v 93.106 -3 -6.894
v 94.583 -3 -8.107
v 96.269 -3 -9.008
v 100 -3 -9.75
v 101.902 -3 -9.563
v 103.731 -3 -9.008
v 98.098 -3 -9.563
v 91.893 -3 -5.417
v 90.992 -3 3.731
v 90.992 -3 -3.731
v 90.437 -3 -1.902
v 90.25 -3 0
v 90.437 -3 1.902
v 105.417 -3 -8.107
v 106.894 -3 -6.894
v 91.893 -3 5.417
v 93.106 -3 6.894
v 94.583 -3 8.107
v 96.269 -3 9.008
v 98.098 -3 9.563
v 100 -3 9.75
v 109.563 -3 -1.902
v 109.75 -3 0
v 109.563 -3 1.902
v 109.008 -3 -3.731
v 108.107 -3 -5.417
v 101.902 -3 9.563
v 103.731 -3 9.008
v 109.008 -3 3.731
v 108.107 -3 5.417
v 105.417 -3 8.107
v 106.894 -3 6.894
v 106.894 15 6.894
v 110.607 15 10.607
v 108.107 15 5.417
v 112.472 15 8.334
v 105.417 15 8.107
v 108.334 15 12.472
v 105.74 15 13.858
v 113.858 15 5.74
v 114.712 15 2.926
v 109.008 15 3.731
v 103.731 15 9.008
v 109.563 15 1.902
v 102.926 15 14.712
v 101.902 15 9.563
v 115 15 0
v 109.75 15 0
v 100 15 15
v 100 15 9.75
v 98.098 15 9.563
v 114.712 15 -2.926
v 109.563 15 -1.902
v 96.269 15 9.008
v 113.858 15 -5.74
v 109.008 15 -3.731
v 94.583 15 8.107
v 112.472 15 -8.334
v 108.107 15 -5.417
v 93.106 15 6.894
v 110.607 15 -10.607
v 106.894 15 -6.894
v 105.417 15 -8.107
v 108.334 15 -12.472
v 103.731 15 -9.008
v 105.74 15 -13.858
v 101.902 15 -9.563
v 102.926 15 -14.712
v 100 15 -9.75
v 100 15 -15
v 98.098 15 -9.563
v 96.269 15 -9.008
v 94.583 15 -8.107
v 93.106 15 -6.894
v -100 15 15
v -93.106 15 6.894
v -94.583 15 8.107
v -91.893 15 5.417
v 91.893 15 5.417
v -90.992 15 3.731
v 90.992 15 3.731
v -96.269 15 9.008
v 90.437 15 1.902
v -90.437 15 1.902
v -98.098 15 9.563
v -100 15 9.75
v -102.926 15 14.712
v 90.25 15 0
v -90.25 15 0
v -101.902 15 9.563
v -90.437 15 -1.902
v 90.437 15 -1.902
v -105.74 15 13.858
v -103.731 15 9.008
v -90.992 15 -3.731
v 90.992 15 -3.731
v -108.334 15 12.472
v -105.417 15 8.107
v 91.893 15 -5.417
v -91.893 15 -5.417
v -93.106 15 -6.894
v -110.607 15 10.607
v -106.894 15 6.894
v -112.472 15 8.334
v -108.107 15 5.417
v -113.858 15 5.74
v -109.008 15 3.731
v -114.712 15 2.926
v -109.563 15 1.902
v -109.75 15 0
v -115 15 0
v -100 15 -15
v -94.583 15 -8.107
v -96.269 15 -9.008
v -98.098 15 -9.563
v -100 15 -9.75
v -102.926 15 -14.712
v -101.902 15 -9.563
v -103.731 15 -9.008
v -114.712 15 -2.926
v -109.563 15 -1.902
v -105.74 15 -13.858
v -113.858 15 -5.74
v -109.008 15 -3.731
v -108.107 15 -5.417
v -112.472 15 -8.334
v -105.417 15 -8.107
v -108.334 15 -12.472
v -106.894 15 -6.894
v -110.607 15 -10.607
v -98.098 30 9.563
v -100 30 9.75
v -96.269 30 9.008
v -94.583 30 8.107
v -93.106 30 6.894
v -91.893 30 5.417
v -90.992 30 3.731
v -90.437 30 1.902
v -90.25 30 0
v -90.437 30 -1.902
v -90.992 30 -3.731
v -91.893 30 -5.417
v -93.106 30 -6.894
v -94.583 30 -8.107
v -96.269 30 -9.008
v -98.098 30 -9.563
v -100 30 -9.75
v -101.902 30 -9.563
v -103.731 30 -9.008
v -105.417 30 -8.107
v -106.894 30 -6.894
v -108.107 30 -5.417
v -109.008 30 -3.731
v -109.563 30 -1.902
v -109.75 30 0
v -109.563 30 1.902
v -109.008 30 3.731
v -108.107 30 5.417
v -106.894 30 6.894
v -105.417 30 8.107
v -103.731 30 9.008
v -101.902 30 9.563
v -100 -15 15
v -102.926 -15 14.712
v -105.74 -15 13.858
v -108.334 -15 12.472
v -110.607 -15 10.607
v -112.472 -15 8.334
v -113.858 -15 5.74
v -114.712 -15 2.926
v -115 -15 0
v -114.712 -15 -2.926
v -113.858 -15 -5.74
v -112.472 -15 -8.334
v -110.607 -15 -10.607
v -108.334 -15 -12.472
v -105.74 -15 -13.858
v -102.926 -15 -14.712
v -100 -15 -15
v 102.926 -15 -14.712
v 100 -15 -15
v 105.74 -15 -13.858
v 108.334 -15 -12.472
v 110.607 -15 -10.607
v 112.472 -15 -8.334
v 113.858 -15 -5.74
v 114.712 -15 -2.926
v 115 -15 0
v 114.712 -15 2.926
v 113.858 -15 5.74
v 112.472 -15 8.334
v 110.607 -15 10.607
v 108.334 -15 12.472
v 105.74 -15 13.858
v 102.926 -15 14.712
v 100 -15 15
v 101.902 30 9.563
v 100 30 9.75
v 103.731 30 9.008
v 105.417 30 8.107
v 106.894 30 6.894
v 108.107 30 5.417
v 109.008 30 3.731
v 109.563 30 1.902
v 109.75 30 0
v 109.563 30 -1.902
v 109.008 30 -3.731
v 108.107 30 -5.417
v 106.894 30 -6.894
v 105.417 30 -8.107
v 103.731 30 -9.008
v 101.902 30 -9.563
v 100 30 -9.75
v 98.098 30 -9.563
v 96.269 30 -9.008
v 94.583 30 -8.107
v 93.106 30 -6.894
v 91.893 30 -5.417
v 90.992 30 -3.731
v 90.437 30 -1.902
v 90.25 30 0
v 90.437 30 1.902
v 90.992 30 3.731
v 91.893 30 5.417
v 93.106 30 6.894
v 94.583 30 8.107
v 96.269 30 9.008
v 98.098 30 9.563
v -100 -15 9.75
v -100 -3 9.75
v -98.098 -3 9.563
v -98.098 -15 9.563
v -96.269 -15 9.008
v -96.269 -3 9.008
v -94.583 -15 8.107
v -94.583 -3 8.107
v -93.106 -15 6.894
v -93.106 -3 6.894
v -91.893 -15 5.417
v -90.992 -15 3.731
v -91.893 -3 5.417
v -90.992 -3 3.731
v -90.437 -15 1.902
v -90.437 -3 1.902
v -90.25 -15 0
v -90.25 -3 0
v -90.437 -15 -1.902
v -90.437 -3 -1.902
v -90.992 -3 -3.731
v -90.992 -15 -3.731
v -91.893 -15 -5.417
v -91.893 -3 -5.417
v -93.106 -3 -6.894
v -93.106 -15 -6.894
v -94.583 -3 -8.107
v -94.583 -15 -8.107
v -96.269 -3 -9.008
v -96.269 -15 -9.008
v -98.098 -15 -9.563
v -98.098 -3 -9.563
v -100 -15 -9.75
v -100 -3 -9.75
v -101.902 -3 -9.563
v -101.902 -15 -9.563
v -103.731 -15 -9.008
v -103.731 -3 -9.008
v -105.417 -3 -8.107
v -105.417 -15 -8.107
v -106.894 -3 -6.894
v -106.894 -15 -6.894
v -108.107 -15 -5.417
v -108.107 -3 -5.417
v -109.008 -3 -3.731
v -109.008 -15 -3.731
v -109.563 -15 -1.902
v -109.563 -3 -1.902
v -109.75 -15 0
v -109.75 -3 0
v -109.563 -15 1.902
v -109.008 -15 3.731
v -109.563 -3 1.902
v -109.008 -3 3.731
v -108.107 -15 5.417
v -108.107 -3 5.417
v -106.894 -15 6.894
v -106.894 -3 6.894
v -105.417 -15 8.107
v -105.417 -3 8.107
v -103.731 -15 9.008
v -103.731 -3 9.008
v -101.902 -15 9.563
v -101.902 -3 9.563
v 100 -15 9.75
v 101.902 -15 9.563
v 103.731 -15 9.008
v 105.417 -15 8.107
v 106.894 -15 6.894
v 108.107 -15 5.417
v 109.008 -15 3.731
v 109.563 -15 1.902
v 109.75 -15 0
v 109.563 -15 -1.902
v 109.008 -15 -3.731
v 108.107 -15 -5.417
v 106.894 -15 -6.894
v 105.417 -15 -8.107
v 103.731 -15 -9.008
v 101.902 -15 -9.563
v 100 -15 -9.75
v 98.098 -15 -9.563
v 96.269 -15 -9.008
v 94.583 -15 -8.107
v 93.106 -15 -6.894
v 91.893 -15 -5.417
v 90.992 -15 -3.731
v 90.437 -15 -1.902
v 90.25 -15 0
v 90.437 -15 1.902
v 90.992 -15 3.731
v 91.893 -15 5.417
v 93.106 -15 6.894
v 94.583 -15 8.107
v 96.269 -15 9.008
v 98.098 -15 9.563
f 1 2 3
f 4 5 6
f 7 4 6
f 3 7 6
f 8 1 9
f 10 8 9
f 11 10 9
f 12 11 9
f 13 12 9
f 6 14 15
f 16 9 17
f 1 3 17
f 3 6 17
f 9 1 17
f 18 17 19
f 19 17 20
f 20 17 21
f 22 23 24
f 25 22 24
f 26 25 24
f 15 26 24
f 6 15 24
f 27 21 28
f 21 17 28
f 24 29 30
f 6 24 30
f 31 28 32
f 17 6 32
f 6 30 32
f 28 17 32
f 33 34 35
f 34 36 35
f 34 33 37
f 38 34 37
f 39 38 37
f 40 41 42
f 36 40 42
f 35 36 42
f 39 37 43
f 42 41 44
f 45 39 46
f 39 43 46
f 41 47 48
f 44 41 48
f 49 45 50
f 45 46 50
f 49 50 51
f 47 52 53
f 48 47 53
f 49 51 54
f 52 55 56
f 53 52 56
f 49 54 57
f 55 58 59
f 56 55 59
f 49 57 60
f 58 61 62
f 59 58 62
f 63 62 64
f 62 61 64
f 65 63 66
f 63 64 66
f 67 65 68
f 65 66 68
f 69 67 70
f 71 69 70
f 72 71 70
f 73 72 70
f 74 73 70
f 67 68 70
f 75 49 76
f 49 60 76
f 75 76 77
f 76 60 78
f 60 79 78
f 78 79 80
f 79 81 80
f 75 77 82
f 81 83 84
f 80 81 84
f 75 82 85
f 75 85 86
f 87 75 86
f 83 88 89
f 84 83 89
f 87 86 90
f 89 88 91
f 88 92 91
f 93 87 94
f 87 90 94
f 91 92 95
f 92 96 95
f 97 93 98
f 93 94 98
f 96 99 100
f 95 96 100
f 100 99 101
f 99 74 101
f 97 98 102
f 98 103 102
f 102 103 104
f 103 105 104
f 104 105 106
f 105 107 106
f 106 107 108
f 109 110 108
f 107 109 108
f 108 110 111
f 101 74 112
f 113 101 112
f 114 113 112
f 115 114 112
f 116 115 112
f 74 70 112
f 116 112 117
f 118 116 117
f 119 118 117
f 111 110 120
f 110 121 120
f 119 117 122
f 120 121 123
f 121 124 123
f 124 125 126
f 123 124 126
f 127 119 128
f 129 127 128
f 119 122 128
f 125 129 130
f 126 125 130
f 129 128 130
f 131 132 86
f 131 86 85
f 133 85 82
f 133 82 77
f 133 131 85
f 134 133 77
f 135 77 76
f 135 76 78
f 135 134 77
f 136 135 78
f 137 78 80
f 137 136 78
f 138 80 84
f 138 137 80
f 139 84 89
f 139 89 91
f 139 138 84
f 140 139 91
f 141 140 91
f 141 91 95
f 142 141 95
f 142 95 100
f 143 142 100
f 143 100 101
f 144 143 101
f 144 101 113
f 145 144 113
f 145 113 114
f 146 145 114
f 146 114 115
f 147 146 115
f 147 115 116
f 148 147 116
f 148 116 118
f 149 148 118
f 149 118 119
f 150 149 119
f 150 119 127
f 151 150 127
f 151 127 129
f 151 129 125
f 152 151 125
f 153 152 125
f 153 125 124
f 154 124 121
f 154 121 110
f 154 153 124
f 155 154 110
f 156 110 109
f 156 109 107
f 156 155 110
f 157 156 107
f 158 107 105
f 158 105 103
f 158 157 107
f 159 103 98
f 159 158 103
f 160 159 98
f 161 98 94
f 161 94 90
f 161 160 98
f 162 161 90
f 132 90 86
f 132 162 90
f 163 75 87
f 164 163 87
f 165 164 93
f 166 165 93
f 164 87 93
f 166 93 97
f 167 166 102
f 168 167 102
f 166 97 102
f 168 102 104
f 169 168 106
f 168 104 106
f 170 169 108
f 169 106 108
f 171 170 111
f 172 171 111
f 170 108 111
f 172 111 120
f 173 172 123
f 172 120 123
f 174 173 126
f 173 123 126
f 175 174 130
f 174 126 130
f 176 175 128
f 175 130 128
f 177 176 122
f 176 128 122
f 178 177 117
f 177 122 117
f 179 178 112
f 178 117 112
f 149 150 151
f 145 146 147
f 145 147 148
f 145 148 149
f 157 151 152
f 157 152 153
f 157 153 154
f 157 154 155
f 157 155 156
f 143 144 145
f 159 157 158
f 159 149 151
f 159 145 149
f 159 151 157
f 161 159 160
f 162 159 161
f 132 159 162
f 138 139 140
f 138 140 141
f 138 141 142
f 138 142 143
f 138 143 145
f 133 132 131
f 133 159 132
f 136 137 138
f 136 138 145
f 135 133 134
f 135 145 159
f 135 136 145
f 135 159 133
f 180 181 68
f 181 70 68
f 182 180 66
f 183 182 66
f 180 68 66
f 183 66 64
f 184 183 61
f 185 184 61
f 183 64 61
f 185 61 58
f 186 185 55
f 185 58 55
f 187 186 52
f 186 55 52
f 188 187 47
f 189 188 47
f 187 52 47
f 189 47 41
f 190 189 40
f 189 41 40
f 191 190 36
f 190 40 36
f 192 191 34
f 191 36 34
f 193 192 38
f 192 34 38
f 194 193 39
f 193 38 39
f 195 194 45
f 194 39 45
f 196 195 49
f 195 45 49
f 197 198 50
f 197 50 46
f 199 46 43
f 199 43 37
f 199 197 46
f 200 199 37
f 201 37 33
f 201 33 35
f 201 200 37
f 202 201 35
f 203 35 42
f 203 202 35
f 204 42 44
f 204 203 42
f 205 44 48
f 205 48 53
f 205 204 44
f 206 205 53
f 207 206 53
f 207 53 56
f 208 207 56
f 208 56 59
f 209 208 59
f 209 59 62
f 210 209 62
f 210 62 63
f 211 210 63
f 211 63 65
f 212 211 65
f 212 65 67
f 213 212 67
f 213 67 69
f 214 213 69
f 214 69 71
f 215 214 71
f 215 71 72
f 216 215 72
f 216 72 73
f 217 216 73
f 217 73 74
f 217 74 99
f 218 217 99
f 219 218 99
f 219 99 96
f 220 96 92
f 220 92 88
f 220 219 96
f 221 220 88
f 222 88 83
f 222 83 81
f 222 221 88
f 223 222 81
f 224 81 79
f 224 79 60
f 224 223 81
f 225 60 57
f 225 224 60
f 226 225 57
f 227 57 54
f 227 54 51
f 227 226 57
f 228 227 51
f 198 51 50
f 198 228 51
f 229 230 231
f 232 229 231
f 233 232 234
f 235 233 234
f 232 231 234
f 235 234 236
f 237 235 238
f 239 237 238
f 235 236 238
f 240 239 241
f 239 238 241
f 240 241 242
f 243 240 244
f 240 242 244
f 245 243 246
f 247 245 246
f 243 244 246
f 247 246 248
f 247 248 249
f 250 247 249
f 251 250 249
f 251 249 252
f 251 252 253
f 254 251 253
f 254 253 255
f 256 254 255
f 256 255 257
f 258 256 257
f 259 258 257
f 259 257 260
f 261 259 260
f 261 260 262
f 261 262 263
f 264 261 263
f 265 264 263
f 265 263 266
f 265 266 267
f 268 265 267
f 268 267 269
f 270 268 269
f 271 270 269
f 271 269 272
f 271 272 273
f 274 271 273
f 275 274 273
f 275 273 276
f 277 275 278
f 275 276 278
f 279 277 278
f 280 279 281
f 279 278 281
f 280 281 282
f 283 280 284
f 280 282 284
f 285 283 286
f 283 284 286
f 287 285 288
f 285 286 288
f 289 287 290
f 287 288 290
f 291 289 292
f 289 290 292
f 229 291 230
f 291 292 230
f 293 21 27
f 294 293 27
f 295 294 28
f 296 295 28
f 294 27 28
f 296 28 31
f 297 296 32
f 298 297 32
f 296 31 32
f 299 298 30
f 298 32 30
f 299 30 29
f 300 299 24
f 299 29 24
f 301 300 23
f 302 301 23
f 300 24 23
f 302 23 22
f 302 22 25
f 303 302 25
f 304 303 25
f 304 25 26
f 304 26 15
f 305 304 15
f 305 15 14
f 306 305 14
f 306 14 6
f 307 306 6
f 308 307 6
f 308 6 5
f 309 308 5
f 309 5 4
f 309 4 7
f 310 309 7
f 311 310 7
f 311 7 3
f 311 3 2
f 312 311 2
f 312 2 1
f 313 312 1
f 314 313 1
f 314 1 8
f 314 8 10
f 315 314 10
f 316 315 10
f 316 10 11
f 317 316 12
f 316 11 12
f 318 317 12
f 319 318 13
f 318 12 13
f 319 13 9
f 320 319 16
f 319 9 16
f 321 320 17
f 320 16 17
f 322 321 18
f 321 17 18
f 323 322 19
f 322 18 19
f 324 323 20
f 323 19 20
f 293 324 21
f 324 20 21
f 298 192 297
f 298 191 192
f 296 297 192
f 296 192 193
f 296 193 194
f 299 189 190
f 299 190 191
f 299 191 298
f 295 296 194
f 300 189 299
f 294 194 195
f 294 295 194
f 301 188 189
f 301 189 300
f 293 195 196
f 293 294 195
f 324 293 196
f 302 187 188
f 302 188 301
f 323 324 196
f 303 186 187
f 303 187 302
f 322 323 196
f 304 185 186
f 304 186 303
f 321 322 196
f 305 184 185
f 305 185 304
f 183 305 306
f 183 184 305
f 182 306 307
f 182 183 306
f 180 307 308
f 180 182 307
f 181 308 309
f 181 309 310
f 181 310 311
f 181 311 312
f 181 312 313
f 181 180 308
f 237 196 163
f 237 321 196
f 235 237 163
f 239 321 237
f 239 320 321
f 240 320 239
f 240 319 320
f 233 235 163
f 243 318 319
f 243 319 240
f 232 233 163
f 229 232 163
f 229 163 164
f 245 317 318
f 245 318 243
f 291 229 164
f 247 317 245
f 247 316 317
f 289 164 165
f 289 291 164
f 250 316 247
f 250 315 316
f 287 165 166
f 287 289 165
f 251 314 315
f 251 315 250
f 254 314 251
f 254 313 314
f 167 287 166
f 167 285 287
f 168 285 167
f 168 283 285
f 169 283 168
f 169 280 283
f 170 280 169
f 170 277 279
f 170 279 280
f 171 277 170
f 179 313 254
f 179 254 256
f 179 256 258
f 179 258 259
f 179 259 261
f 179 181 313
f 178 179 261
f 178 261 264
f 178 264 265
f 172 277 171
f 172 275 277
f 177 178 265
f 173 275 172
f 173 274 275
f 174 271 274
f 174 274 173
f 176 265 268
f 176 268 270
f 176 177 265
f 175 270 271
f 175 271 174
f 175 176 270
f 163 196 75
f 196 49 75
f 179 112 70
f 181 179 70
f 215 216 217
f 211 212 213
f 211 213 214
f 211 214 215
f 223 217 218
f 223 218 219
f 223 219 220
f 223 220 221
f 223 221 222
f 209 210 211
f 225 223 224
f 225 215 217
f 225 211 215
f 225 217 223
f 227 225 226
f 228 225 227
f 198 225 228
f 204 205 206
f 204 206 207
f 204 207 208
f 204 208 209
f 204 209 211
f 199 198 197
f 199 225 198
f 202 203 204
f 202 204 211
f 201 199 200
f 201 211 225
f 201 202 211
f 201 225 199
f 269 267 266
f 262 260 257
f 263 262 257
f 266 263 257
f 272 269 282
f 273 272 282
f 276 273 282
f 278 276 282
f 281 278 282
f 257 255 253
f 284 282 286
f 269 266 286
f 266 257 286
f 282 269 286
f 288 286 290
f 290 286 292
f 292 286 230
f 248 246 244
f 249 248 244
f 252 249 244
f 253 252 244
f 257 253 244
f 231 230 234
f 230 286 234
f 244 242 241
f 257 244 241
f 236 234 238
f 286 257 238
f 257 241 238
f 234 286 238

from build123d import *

# Parameters (mm, degrees)
BOSS_EXTRUDE1_DEPTH = 15
SKETCH2_R           = 9.75
CUT_EXTRUDE1_DEPTH  = 117.940155635
BOSS_EXTRUDE2_START = 30
SKETCH2_2_R         = 9.75
BOSS_EXTRUDE2_DEPTH = 30
SKETCH2_3_R         = 9.75
BOSS_EXTRUDE3_DEPTH = 3


with BuildPart() as part:
    # Sketch1 → Boss-Extrude1 (new, symmetric)
    with BuildSketch(Plane(origin=(0, 0, 0), x_dir=(1, 0, 0), z_dir=(0, 1, 0))):
        with BuildLine():
            Line((-100, 15), (100, 15))
            ThreePointArc((100, 15), (115, 0), (100, -15))
            Line((100, -15), (-100, -15))
            ThreePointArc((-100, -15), (-115, 0), (-100, 15))
        make_face()
    extrude(amount=BOSS_EXTRUDE1_DEPTH, both=True)

    # Sketch2 → Cut-Extrude1 (cut, through all)
    with BuildSketch(Plane(origin=(0, 0, 0), x_dir=(1, 0, 0), z_dir=(0, 1, 0))):
        with Locations((100, 0)):
            Circle(SKETCH2_R)
        with Locations((-100, 0)):
            Circle(SKETCH2_R)
    extrude(amount=-CUT_EXTRUDE1_DEPTH, mode=Mode.SUBTRACT)

    # Sketch2<2> → Boss-Extrude2 (add)
    with BuildSketch(Plane(origin=(0, 0, 0), x_dir=(1, 0, 0), z_dir=(0, 1, 0)).offset(BOSS_EXTRUDE2_START)):
        with Locations((100, 0)):
            Circle(SKETCH2_2_R)
        with Locations((-100, 0)):
            Circle(SKETCH2_2_R)
    extrude(amount=-BOSS_EXTRUDE2_DEPTH)

    # Sketch2<3> → Boss-Extrude3 (add)
    with BuildSketch(Plane(origin=(0, 0, 0), x_dir=(1, 0, 0), z_dir=(0, 1, 0))):
        with Locations((100, 0)):
            Circle(SKETCH2_3_R)
        with Locations((-100, 0)):
            Circle(SKETCH2_3_R)
    extrude(amount=-BOSS_EXTRUDE3_DEPTH)


solid = part.part
